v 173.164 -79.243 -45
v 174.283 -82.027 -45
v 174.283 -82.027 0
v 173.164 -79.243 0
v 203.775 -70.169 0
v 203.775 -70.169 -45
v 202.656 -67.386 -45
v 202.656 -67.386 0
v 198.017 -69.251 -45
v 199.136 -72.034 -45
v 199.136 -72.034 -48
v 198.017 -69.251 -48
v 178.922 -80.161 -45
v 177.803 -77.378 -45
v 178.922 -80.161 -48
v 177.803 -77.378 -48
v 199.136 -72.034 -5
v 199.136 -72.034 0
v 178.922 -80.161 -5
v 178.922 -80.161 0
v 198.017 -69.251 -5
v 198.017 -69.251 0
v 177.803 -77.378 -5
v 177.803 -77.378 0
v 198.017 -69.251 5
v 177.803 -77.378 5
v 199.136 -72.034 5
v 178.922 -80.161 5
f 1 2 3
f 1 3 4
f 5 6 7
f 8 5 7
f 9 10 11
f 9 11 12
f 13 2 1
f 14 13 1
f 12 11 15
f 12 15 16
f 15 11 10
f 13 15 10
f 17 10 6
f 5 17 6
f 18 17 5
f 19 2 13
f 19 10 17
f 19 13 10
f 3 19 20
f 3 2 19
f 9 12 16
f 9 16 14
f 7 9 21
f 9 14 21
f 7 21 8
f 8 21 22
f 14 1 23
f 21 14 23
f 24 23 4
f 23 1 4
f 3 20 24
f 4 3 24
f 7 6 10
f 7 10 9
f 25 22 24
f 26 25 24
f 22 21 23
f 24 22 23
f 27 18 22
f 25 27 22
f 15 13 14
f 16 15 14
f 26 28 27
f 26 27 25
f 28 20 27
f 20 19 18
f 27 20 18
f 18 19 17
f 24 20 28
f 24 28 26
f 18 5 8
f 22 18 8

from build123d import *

# Parameters (mm, degrees)
ESTRUSIONE_ESTRUSIONE1_DEPTH      = 48
ESTRUSIONE_ESTRUSIONE1_DEPTH_BACK = 5
SCHIZZO2_W                        = 45
SCHIZZO2_H                        = 3
ESTRUSIONE_ESTRUSIONE2_DEPTH      = 5
CORPO_SPOSTA_COPIA1_START         = 131.104025403
CORPO_SPOSTA_COPIA1_OUTLINE_W     = 3
CORPO_SPOSTA_COPIA1_OUTLINE_H     = 43
CORPO_SPOSTA_COPIA1_DEPTH         = 31.786555516
CORPO_SPOSTA_COPIA1_2_OUTLINE_W   = 3
CORPO_SPOSTA_COPIA1_2_OUTLINE_H   = 5
CORPO_SPOSTA_COPIA1_2_DEPTH       = 5
CORPO_SPOSTA_COPIA1_START_2       = 157.890580919
CORPO_SPOSTA_COPIA1_3_OUTLINE_W   = 3
CORPO_SPOSTA_COPIA1_3_OUTLINE_H   = 5
CORPO_SPOSTA_COPIA1_3_DEPTH       = 5
CORPO_SPOSTA_COPIA1_4_OUTLINE_W   = 3
CORPO_SPOSTA_COPIA1_4_OUTLINE_H   = 45
CORPO_SPOSTA_COPIA1_4_DEPTH       = 31.786555516
CORPO_SPOSTA_COPIA1_START_3       = 136.104025403
CORPO_SPOSTA_COPIA1_5_OUTLINE_W   = 3
CORPO_SPOSTA_COPIA1_5_OUTLINE_H   = 3
CORPO_SPOSTA_COPIA1_5_DEPTH       = 21.786555516


# Read off the part's stored shape, not the designer's step: Corpo-Sposta/copia1
with BuildPart() as part:
    # Schizzo1 → Estrusione-Estrusione1 (new, two sides: drawn at the far end of the back side and taken through both)
    with BuildSketch(Plane.XY.offset(-ESTRUSIONE_ESTRUSIONE1_DEPTH_BACK)):
        Polygon((198.017140331, -69.250735791), (177.803209237, -77.377911869), (178.92231814, -80.161362114), (199.136249234, -72.034186035), align=None)
    extrude(amount=ESTRUSIONE_ESTRUSIONE1_DEPTH + ESTRUSIONE_ESTRUSIONE1_DEPTH_BACK)

    # Schizzo2 → Estrusione-Estrusione2 (add)
    with BuildSketch(Plane(origin=(146.49352536, 58.898918246, 0), x_dir=(0, 0, -1), z_dir=(0.9278167482016688, 0.3730363008562049, 0))):
        with Locations((-22.5, -139.619574027)):
            Rectangle(SCHIZZO2_W, SCHIZZO2_H)
    estrusione_estrusione2 = extrude(amount=ESTRUSIONE_ESTRUSIONE2_DEPTH)

    # Specchia1: Estrusione-Estrusione2 across plane
    add(estrusione_estrusione2.mirror(Plane(origin=(136.386559813, 54.835330207, 0), x_dir=(0, 0, 1), z_dir=(0.9278167482016688, 0.37303630085620504, 0))))

    # Corpo-Sposta/copia1 outline → Corpo-Sposta/copia1 (cut)
    with BuildSketch(Plane(origin=(0, 0, 0), x_dir=(-0.373036300856202, 0.92781674820167, 0), z_dir=(0.92781674820167, 0.373036300856202, 0)).offset(CORPO_SPOSTA_COPIA1_START)):
        with Locations((-139.619574027, 26.5)):
            Rectangle(CORPO_SPOSTA_COPIA1_OUTLINE_W, CORPO_SPOSTA_COPIA1_OUTLINE_H)
    extrude(amount=CORPO_SPOSTA_COPIA1_DEPTH, mode=Mode.SUBTRACT)

    # Corpo-Sposta_copia1 2 outline → Corpo-Sposta_copia1 2 (cut)
    with BuildSketch(Plane(origin=(0, 0, 0), x_dir=(-0.373036300856202, 0.92781674820167, 0), z_dir=(0.92781674820167, 0.373036300856202, 0)).offset(CORPO_SPOSTA_COPIA1_START)):
        with Locations((-139.619574027, 2.5)):
            Rectangle(CORPO_SPOSTA_COPIA1_2_OUTLINE_W, CORPO_SPOSTA_COPIA1_2_OUTLINE_H)
    extrude(amount=CORPO_SPOSTA_COPIA1_2_DEPTH, mode=Mode.SUBTRACT)

    # Corpo-Sposta_copia1 3 outline → Corpo-Sposta_copia1 3 (cut)
    with BuildSketch(Plane(origin=(0, 0, 0), x_dir=(-0.373036300856202, 0.92781674820167, 0), z_dir=(0.92781674820167, 0.373036300856202, 0)).offset(CORPO_SPOSTA_COPIA1_START_2)):
        with Locations((-139.619574027, 2.5)):
            Rectangle(CORPO_SPOSTA_COPIA1_3_OUTLINE_W, CORPO_SPOSTA_COPIA1_3_OUTLINE_H)
    extrude(amount=CORPO_SPOSTA_COPIA1_3_DEPTH, mode=Mode.SUBTRACT)

    # Corpo-Sposta_copia1 4 outline → Corpo-Sposta_copia1 4 (add)
    with BuildSketch(Plane(origin=(0, 0, 0), x_dir=(-0.373036300856202, 0.92781674820167, 0), z_dir=(0.92781674820167, 0.373036300856202, 0)).offset(CORPO_SPOSTA_COPIA1_START)):
        with Locations((-139.619574027, -22.5)):
            Rectangle(CORPO_SPOSTA_COPIA1_4_OUTLINE_W, CORPO_SPOSTA_COPIA1_4_OUTLINE_H)
    extrude(amount=CORPO_SPOSTA_COPIA1_4_DEPTH)

    # Corpo-Sposta_copia1 5 outline → Corpo-Sposta_copia1 5 (add)
    with BuildSketch(Plane(origin=(0, 0, 0), x_dir=(-0.373036300856202, 0.92781674820167, 0), z_dir=(0.92781674820167, 0.373036300856202, 0)).offset(CORPO_SPOSTA_COPIA1_START_3)):
        with Locations((-139.619574027, -46.5)):
            Rectangle(CORPO_SPOSTA_COPIA1_5_OUTLINE_W, CORPO_SPOSTA_COPIA1_5_OUTLINE_H)
    extrude(amount=CORPO_SPOSTA_COPIA1_5_DEPTH)


solid = part.part
